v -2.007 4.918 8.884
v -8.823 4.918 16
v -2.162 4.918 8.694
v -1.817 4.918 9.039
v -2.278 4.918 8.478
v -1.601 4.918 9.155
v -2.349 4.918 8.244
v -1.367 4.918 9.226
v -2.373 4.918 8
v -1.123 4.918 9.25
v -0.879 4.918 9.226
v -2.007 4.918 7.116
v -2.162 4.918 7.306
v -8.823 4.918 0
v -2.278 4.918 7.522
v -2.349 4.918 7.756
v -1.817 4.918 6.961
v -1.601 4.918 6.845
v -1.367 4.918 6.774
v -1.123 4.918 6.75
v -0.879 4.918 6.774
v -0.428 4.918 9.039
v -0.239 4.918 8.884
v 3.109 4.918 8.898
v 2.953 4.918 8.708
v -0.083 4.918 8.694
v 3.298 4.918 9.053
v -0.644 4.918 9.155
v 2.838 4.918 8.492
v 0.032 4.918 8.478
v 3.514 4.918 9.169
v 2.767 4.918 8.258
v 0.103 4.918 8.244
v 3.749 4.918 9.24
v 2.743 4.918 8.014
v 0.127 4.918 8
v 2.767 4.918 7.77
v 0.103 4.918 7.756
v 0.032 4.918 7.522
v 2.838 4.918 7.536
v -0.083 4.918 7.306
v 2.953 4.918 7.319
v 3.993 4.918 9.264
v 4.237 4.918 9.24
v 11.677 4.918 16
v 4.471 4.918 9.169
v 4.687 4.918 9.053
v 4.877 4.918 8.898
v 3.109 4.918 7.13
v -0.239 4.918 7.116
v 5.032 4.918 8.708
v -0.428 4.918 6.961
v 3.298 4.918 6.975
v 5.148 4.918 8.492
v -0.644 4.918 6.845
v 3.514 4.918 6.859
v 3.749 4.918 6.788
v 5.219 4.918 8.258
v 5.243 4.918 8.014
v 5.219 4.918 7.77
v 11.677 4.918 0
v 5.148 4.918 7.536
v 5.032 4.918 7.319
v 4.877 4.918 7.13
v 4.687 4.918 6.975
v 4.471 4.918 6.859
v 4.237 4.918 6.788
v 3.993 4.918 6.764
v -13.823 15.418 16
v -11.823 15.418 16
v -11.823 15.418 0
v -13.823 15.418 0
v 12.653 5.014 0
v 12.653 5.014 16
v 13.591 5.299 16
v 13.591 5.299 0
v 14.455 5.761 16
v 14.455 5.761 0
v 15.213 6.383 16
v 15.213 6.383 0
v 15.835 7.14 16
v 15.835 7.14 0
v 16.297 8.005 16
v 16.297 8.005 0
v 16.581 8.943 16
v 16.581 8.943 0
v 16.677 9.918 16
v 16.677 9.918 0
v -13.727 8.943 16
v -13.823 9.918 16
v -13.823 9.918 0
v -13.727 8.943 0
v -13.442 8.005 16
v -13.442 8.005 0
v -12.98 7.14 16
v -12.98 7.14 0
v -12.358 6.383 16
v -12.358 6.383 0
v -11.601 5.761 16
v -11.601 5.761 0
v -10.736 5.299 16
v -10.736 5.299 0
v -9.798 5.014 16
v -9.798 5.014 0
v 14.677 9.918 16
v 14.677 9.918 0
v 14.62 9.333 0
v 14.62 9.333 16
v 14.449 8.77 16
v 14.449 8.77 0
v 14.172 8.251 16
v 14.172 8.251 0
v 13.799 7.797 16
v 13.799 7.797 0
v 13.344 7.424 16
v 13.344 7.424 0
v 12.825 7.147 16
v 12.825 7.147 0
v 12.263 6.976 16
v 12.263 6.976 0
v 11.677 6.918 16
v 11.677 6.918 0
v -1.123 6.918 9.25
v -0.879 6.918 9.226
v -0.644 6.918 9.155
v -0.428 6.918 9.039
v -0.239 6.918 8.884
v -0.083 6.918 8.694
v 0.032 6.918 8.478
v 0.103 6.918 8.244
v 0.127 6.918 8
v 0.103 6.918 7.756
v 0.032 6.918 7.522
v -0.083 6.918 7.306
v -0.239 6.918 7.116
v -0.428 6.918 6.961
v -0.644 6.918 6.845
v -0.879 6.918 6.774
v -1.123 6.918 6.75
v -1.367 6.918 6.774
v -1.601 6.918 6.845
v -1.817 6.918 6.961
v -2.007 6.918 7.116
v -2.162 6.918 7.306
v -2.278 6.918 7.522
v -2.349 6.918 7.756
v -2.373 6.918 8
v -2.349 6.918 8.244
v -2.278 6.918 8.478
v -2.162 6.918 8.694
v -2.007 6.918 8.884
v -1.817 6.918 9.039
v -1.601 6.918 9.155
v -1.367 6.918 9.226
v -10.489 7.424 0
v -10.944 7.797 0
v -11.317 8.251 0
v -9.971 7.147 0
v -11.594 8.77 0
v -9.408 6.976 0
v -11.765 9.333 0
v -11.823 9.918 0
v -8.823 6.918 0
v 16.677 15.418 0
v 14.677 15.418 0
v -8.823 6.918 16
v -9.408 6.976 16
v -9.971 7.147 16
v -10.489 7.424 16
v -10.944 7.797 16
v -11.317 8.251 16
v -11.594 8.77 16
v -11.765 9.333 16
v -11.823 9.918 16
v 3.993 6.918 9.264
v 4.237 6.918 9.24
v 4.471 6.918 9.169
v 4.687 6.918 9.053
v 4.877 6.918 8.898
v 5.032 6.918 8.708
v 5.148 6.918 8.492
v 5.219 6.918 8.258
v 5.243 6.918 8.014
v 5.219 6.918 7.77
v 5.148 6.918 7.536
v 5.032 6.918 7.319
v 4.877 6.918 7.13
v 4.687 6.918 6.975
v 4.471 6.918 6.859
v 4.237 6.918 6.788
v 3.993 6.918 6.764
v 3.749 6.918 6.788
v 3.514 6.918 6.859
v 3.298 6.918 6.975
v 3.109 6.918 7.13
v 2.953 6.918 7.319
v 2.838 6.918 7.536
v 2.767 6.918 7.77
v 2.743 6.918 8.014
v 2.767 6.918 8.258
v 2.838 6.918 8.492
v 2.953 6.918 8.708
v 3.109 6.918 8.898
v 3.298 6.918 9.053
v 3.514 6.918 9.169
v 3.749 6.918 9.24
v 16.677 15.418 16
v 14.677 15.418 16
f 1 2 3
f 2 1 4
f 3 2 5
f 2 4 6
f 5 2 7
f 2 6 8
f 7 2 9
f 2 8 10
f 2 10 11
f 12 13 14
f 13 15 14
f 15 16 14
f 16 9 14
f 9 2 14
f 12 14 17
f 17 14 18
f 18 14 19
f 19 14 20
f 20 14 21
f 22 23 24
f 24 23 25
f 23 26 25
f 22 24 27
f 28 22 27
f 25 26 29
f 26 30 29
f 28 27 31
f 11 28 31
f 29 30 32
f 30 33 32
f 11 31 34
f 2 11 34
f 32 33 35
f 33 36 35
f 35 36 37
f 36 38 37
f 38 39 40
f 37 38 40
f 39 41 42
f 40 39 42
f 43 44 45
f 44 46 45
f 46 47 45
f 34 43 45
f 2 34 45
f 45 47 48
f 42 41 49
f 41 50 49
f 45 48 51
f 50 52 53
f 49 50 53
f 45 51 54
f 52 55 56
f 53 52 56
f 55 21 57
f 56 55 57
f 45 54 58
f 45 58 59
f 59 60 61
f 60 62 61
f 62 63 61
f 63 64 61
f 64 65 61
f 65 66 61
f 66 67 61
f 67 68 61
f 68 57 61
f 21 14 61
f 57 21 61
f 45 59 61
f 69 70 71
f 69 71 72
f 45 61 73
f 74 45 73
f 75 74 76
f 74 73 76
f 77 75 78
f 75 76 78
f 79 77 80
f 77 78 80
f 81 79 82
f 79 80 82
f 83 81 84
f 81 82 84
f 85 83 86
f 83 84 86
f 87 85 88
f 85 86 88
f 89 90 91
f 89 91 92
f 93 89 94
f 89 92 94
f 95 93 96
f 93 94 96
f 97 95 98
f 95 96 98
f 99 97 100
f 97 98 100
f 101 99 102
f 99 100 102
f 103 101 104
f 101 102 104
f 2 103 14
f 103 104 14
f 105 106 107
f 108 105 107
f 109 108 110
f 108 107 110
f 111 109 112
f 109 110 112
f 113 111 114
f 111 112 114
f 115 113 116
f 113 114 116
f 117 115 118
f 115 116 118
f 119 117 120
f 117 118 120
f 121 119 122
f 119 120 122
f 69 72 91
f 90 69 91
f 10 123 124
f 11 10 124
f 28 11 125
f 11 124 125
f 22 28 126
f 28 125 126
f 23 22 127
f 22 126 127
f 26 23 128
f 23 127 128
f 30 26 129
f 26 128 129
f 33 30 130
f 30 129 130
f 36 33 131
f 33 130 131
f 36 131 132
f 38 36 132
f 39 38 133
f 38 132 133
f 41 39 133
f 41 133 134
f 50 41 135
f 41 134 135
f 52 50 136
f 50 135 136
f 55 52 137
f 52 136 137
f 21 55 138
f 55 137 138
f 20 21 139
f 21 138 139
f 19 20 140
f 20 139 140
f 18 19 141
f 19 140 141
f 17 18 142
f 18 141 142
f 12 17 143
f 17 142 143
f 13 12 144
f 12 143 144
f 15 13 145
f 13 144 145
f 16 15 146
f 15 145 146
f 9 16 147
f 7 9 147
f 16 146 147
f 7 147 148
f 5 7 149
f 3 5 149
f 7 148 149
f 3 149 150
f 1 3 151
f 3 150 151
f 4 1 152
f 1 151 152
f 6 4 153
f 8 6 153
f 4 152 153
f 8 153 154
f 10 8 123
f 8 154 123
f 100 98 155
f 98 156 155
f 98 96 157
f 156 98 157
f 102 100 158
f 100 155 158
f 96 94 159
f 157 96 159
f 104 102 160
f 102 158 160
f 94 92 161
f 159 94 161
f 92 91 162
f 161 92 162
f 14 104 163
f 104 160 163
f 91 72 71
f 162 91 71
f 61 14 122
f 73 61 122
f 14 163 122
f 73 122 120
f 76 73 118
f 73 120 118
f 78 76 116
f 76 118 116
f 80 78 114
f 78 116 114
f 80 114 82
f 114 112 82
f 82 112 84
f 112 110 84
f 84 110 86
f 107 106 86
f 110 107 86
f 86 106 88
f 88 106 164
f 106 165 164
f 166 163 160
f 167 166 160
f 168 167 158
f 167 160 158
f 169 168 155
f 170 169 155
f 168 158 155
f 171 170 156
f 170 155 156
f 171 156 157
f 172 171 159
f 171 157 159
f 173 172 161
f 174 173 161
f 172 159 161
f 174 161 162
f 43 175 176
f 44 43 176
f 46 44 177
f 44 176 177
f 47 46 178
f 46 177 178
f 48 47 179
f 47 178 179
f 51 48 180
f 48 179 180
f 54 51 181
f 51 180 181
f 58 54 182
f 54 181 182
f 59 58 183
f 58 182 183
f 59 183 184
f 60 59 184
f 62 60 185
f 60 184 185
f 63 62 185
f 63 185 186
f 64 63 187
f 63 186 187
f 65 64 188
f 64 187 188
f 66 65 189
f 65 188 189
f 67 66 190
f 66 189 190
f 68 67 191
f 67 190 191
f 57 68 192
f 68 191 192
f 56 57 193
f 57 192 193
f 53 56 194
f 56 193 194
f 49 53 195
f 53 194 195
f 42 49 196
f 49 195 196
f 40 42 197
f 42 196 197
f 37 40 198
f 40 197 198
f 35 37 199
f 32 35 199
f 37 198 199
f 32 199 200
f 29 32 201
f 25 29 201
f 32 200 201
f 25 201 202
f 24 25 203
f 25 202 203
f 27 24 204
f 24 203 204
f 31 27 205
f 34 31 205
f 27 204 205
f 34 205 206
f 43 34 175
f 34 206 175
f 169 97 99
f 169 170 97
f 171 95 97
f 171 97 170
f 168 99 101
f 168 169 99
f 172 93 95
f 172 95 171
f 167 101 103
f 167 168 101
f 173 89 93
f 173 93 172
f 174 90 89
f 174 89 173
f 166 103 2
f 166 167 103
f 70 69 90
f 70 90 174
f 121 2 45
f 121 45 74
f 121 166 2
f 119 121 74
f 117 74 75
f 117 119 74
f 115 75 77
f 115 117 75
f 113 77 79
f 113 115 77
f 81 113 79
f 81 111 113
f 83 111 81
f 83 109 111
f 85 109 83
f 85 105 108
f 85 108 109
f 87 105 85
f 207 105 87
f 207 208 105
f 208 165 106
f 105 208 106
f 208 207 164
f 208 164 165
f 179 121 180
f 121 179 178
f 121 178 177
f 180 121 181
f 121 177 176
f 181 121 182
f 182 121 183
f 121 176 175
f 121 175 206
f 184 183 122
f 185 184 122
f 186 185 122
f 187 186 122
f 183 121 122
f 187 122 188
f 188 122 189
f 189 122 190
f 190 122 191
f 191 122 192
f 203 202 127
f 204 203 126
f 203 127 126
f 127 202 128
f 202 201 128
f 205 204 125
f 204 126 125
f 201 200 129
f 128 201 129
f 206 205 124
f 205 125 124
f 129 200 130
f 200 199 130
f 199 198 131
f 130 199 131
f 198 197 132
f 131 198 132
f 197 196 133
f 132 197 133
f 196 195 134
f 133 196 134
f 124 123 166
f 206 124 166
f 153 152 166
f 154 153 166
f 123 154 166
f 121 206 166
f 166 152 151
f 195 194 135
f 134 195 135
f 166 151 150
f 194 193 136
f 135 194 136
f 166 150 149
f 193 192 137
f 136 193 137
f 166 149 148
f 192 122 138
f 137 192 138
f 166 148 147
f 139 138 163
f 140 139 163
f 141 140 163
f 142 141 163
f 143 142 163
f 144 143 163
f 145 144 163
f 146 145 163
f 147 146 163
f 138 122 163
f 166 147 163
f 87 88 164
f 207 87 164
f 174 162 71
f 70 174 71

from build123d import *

# Parameters (mm, degrees)
BASE_FLANGE1_DEPTH = 16
SKETCH8_R          = 1.25
CUT_EXTRUDE1_DEPTH = 2


# Sheet-metal steps are written as plain solids
with BuildPart() as part:
    # Sketch1 → Base-Flange1 (new body)
    with BuildSketch(Plane.XY):
        with BuildLine():
            Line((-13.822681927, 15.418198529), (-13.822681927, 9.918198529))
            ThreePointArc((-13.822681927, 9.918198529), (-12.358215833, 6.382664623), (-8.822681927, 4.918198529))
            Line((-8.822681927, 4.918198529), (11.677318073, 4.918198529))
            ThreePointArc((11.677318073, 4.918198529), (15.212851979, 6.382664623), (16.677318073, 9.918198529))
            Line((16.677318073, 9.918198529), (16.677318073, 15.418198529))
            Line((16.677318073, 15.418198529), (14.677318073, 15.418198529))
            Line((14.677318073, 15.418198529), (14.677318073, 9.918198529))
            ThreePointArc((14.677318073, 9.918198529), (13.798638417, 7.796878186), (11.677318073, 6.918198529))
            Line((11.677318073, 6.918198529), (-8.822681927, 6.918198529))
            ThreePointArc((-8.822681927, 6.918198529), (-10.94400227, 7.796878186), (-11.822681927, 9.918198529))
            Line((-11.822681927, 9.918198529), (-11.822681927, 15.418198529))
            Line((-11.822681927, 15.418198529), (-13.822681927, 15.418198529))
        make_face()
    extrude(amount=BASE_FLANGE1_DEPTH)

    # Sketch8 → Cut-Extrude1 (cut)
    with BuildSketch(Plane(origin=(0, 6.918198529, 0), x_dir=(1, 0, 0), z_dir=(0, 1, 0))):
        with Locations(Location((3.992812071, -8.013954427, 0), (0, 0, 270))):
            Circle(SKETCH8_R)
        with Locations(Location((-1.122681927, -8, 0), (0, 0, 270))):
            Circle(SKETCH8_R)
    extrude(amount=-CUT_EXTRUDE1_DEPTH, mode=Mode.SUBTRACT)


solid = part.part
